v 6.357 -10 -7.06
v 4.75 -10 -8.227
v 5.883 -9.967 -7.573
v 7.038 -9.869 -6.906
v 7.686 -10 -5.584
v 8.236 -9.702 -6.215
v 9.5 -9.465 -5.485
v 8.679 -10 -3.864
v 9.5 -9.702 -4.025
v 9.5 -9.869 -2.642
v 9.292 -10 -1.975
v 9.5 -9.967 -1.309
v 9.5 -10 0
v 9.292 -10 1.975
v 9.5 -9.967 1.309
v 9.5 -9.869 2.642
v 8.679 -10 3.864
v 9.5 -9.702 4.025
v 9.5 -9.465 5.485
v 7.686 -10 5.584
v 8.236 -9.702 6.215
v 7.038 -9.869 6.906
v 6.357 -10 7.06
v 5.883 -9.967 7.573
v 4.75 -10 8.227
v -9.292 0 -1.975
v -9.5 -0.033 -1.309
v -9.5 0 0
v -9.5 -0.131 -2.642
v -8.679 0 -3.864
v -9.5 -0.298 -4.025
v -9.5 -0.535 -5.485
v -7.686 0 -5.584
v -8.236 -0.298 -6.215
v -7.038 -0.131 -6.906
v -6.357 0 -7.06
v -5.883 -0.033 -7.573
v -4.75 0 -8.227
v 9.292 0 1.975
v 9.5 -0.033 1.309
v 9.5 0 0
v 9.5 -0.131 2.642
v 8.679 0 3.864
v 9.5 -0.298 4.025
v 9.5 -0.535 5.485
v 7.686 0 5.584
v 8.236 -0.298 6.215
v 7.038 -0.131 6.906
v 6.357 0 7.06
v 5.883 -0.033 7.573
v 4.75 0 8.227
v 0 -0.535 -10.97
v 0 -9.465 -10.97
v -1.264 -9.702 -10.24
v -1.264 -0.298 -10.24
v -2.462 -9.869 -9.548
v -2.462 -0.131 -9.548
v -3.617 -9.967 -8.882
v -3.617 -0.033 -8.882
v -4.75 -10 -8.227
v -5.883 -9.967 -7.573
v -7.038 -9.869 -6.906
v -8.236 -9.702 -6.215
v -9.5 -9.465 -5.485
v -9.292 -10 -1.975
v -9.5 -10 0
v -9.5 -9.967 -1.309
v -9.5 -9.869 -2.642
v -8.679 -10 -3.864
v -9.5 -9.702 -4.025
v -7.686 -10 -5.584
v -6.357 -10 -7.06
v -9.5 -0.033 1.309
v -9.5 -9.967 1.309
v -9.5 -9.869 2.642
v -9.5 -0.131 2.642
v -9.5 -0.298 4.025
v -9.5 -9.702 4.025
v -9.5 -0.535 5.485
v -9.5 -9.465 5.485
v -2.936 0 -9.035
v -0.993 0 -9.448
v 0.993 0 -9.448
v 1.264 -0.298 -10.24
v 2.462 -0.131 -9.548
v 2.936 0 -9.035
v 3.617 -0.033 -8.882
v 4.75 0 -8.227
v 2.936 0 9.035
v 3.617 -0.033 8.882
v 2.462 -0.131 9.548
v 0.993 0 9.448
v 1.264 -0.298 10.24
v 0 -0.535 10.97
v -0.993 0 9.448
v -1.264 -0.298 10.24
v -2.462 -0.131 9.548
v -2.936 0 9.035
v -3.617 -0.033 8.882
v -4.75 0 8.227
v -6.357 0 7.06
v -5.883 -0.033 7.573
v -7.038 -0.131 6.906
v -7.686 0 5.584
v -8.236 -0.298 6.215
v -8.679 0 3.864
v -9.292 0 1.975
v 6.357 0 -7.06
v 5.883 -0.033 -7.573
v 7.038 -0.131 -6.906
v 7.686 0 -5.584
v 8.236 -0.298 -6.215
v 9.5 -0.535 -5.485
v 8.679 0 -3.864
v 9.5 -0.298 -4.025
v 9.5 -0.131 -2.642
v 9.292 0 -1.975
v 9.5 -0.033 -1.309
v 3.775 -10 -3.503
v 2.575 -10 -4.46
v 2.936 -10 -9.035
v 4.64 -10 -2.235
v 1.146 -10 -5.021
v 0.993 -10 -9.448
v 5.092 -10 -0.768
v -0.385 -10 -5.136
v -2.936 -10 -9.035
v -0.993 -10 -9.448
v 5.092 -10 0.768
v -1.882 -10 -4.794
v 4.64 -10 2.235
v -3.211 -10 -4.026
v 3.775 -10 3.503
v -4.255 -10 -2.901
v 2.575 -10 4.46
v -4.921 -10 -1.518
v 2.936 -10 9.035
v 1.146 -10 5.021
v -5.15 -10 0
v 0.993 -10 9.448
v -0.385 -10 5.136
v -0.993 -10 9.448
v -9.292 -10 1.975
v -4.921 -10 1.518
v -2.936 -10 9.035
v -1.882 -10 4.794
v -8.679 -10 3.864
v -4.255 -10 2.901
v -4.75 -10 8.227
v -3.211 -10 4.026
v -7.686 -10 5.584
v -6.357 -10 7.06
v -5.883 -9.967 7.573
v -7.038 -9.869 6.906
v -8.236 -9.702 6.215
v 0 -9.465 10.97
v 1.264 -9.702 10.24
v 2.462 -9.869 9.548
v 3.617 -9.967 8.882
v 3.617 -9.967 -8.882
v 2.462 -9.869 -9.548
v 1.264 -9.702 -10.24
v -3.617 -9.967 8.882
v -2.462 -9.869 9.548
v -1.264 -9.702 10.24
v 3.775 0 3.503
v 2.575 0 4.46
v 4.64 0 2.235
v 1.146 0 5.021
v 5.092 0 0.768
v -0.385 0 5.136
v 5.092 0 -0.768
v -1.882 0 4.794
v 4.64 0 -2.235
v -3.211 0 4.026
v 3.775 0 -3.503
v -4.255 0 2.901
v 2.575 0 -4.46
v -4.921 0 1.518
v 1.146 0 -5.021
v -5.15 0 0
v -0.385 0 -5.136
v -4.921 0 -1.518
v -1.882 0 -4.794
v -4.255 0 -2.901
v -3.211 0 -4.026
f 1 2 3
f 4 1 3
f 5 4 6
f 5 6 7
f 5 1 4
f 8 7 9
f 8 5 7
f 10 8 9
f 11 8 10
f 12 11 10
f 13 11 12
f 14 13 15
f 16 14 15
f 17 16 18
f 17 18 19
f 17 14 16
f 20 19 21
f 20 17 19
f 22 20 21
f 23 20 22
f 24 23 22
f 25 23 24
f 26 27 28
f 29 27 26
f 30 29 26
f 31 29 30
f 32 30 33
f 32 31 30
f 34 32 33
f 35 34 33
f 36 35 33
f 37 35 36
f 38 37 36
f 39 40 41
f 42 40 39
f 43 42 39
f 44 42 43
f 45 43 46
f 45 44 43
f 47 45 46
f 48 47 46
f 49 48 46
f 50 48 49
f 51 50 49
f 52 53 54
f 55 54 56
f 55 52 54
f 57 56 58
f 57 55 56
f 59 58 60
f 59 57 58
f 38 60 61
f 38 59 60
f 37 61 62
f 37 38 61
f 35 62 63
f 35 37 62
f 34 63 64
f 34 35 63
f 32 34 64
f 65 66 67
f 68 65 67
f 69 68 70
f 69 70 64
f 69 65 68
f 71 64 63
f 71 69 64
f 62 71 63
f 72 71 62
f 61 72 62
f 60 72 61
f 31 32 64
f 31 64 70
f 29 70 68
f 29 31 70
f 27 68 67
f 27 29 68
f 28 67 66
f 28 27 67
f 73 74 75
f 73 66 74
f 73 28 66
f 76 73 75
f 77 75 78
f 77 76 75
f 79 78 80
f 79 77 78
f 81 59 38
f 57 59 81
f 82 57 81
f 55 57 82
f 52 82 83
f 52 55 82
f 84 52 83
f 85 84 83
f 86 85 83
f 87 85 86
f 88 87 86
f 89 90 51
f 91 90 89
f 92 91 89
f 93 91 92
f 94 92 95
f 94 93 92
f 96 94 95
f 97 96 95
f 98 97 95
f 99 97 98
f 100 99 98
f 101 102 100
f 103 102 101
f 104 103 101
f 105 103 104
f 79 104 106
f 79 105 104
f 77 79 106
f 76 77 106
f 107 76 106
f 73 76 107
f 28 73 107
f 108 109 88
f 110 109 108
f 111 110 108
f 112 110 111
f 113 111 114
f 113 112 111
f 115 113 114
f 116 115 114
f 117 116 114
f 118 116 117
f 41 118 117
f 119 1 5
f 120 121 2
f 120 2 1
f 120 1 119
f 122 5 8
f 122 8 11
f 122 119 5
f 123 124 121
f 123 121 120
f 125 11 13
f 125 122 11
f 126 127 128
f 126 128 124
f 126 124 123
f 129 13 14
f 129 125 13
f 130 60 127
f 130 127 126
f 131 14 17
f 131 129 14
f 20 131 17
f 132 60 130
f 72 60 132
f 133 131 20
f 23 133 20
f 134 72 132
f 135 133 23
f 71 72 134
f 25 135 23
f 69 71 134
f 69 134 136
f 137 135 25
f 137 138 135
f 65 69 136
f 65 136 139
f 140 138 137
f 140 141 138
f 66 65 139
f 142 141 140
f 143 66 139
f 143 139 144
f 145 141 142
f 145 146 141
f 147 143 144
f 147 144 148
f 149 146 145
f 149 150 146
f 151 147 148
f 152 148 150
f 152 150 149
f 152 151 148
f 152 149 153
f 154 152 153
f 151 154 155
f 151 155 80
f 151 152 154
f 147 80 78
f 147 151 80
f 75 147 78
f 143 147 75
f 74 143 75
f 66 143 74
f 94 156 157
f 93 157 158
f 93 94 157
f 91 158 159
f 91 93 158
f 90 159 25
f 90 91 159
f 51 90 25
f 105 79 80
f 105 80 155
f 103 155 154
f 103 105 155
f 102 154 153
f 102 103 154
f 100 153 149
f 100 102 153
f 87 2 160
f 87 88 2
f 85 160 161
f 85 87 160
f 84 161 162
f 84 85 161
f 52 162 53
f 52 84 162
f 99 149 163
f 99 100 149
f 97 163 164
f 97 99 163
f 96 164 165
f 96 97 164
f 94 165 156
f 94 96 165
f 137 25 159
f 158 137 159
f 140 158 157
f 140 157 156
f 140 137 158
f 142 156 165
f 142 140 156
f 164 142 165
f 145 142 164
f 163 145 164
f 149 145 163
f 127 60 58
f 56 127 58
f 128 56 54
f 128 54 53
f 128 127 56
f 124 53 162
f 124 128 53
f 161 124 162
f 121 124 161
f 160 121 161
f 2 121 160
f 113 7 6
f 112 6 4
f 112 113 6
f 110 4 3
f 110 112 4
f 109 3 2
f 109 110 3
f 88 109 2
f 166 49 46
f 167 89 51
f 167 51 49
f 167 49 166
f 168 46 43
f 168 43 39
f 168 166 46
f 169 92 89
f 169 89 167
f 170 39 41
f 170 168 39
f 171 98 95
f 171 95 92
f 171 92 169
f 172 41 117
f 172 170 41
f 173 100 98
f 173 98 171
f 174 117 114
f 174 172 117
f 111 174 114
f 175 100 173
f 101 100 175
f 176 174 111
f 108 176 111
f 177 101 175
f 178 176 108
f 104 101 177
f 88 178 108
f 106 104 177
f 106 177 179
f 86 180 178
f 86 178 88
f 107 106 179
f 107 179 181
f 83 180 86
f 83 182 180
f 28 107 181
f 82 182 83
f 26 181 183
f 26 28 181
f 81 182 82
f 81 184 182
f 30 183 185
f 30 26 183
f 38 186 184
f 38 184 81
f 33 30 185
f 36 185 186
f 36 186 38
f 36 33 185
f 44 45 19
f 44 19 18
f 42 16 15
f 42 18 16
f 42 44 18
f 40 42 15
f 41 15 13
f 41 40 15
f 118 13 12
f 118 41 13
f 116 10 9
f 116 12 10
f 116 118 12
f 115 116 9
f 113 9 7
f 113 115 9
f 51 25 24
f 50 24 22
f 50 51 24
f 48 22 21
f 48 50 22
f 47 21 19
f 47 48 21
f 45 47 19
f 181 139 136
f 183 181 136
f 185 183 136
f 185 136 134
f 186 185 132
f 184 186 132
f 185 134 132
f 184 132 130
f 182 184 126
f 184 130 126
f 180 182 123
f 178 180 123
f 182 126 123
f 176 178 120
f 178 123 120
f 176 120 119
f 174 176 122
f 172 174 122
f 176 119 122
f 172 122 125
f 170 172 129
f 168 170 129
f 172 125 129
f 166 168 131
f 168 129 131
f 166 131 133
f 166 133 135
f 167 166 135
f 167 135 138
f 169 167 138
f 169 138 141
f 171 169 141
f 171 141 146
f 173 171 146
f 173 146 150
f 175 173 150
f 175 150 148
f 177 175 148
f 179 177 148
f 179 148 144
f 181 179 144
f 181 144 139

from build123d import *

# Parameters (mm, degrees)
F3_DEPTH      = 38
F3_DEPTH_BACK = 10.001
F4_D          = 10.3


# Not quite as in the source:
# - an extrude ends at something that could not be found from the text; its depth is read off the source's solid


with BuildPart() as f2:
    # F1 (on Right) → F2 (revolve)
    with BuildSketch(Plane.YZ):
        Polygon((-10, 0), (0, 0), (0, 9.5), (-0.5349107164, 10.9696551146), (-9.4650892836, 10.9696551146), (-10, 9.5), align=None)
    revolve(axis=Axis((0, -5, 0), (0, -1, 0)))

    # F0 (on Front) → F3 (cut, two sides)
    with BuildSketch(Plane.XZ) as f3_sk:
        with BuildLine():
            Line((-9.5, 5.4848275573), (-4.7499997575, 8.227241476))
            Line((-4.7499997575, 8.227241476), (0, 10.9696551146))
            ThreePointArc((0, 10.9696551146), (-5.4848275573, 9.5), (-9.5, 5.4848275573))
        make_face()
        with BuildLine():
            Line((-9.5, -5.4848275573), (-9.5, 0))
            Line((-9.5, 0), (-9.5, 5.4848275573))
            ThreePointArc((-9.5, 5.4848275573), (-10.9696551146, 0), (-9.5, -5.4848275573))
        make_face()
        with BuildLine():
            Line((0, 10.9696551146), (4.7500001405, 8.2272412548))
            Line((4.7500001405, 8.2272412548), (9.5, 5.4848275573))
            ThreePointArc((9.5, 5.4848275573), (5.4848275573, 9.5), (0, 10.9696551146))
        make_face()
        with BuildLine():
            Line((9.5, 5.4848275573), (9.5, 0))
            Line((9.5, 0), (9.5, -5.4848275573))
            ThreePointArc((9.5, -5.4848275573), (10.5958731807, -2.8391556619), (10.9696551146, 0))
            ThreePointArc((10.9696551146, 0), (10.5958731807, 2.8391556619), (9.5, 5.4848275573))
        make_face()
        with BuildLine():
            Line((9.5, -5.4848275573), (4.7500001405, -8.2272412548))
            Line((4.7500001405, -8.2272412548), (0, -10.9696551146))
            ThreePointArc((0, -10.9696551146), (5.4848275573, -9.5), (9.5, -5.4848275573))
        make_face()
        with BuildLine():
            Line((0, -10.9696551146), (-4.7499999942, -8.2272413393))
            Line((-4.7499999942, -8.2272413393), (-9.5, -5.4848275573))
            ThreePointArc((-9.5, -5.4848275573), (-5.4848275573, -9.5), (0, -10.9696551146))
        make_face()
    extrude(amount=-F3_DEPTH, mode=Mode.SUBTRACT)
    extrude(f3_sk.sketch, amount=F3_DEPTH_BACK, mode=Mode.SUBTRACT)

    # F4 (through all)
    with Locations(Plane(origin=(0, 0, 0), x_dir=(1, 0, 0), z_dir=(0, 1, 0))):
        with Locations((0, 0)):
            Hole(F4_D / 2)


solid = f2.part
